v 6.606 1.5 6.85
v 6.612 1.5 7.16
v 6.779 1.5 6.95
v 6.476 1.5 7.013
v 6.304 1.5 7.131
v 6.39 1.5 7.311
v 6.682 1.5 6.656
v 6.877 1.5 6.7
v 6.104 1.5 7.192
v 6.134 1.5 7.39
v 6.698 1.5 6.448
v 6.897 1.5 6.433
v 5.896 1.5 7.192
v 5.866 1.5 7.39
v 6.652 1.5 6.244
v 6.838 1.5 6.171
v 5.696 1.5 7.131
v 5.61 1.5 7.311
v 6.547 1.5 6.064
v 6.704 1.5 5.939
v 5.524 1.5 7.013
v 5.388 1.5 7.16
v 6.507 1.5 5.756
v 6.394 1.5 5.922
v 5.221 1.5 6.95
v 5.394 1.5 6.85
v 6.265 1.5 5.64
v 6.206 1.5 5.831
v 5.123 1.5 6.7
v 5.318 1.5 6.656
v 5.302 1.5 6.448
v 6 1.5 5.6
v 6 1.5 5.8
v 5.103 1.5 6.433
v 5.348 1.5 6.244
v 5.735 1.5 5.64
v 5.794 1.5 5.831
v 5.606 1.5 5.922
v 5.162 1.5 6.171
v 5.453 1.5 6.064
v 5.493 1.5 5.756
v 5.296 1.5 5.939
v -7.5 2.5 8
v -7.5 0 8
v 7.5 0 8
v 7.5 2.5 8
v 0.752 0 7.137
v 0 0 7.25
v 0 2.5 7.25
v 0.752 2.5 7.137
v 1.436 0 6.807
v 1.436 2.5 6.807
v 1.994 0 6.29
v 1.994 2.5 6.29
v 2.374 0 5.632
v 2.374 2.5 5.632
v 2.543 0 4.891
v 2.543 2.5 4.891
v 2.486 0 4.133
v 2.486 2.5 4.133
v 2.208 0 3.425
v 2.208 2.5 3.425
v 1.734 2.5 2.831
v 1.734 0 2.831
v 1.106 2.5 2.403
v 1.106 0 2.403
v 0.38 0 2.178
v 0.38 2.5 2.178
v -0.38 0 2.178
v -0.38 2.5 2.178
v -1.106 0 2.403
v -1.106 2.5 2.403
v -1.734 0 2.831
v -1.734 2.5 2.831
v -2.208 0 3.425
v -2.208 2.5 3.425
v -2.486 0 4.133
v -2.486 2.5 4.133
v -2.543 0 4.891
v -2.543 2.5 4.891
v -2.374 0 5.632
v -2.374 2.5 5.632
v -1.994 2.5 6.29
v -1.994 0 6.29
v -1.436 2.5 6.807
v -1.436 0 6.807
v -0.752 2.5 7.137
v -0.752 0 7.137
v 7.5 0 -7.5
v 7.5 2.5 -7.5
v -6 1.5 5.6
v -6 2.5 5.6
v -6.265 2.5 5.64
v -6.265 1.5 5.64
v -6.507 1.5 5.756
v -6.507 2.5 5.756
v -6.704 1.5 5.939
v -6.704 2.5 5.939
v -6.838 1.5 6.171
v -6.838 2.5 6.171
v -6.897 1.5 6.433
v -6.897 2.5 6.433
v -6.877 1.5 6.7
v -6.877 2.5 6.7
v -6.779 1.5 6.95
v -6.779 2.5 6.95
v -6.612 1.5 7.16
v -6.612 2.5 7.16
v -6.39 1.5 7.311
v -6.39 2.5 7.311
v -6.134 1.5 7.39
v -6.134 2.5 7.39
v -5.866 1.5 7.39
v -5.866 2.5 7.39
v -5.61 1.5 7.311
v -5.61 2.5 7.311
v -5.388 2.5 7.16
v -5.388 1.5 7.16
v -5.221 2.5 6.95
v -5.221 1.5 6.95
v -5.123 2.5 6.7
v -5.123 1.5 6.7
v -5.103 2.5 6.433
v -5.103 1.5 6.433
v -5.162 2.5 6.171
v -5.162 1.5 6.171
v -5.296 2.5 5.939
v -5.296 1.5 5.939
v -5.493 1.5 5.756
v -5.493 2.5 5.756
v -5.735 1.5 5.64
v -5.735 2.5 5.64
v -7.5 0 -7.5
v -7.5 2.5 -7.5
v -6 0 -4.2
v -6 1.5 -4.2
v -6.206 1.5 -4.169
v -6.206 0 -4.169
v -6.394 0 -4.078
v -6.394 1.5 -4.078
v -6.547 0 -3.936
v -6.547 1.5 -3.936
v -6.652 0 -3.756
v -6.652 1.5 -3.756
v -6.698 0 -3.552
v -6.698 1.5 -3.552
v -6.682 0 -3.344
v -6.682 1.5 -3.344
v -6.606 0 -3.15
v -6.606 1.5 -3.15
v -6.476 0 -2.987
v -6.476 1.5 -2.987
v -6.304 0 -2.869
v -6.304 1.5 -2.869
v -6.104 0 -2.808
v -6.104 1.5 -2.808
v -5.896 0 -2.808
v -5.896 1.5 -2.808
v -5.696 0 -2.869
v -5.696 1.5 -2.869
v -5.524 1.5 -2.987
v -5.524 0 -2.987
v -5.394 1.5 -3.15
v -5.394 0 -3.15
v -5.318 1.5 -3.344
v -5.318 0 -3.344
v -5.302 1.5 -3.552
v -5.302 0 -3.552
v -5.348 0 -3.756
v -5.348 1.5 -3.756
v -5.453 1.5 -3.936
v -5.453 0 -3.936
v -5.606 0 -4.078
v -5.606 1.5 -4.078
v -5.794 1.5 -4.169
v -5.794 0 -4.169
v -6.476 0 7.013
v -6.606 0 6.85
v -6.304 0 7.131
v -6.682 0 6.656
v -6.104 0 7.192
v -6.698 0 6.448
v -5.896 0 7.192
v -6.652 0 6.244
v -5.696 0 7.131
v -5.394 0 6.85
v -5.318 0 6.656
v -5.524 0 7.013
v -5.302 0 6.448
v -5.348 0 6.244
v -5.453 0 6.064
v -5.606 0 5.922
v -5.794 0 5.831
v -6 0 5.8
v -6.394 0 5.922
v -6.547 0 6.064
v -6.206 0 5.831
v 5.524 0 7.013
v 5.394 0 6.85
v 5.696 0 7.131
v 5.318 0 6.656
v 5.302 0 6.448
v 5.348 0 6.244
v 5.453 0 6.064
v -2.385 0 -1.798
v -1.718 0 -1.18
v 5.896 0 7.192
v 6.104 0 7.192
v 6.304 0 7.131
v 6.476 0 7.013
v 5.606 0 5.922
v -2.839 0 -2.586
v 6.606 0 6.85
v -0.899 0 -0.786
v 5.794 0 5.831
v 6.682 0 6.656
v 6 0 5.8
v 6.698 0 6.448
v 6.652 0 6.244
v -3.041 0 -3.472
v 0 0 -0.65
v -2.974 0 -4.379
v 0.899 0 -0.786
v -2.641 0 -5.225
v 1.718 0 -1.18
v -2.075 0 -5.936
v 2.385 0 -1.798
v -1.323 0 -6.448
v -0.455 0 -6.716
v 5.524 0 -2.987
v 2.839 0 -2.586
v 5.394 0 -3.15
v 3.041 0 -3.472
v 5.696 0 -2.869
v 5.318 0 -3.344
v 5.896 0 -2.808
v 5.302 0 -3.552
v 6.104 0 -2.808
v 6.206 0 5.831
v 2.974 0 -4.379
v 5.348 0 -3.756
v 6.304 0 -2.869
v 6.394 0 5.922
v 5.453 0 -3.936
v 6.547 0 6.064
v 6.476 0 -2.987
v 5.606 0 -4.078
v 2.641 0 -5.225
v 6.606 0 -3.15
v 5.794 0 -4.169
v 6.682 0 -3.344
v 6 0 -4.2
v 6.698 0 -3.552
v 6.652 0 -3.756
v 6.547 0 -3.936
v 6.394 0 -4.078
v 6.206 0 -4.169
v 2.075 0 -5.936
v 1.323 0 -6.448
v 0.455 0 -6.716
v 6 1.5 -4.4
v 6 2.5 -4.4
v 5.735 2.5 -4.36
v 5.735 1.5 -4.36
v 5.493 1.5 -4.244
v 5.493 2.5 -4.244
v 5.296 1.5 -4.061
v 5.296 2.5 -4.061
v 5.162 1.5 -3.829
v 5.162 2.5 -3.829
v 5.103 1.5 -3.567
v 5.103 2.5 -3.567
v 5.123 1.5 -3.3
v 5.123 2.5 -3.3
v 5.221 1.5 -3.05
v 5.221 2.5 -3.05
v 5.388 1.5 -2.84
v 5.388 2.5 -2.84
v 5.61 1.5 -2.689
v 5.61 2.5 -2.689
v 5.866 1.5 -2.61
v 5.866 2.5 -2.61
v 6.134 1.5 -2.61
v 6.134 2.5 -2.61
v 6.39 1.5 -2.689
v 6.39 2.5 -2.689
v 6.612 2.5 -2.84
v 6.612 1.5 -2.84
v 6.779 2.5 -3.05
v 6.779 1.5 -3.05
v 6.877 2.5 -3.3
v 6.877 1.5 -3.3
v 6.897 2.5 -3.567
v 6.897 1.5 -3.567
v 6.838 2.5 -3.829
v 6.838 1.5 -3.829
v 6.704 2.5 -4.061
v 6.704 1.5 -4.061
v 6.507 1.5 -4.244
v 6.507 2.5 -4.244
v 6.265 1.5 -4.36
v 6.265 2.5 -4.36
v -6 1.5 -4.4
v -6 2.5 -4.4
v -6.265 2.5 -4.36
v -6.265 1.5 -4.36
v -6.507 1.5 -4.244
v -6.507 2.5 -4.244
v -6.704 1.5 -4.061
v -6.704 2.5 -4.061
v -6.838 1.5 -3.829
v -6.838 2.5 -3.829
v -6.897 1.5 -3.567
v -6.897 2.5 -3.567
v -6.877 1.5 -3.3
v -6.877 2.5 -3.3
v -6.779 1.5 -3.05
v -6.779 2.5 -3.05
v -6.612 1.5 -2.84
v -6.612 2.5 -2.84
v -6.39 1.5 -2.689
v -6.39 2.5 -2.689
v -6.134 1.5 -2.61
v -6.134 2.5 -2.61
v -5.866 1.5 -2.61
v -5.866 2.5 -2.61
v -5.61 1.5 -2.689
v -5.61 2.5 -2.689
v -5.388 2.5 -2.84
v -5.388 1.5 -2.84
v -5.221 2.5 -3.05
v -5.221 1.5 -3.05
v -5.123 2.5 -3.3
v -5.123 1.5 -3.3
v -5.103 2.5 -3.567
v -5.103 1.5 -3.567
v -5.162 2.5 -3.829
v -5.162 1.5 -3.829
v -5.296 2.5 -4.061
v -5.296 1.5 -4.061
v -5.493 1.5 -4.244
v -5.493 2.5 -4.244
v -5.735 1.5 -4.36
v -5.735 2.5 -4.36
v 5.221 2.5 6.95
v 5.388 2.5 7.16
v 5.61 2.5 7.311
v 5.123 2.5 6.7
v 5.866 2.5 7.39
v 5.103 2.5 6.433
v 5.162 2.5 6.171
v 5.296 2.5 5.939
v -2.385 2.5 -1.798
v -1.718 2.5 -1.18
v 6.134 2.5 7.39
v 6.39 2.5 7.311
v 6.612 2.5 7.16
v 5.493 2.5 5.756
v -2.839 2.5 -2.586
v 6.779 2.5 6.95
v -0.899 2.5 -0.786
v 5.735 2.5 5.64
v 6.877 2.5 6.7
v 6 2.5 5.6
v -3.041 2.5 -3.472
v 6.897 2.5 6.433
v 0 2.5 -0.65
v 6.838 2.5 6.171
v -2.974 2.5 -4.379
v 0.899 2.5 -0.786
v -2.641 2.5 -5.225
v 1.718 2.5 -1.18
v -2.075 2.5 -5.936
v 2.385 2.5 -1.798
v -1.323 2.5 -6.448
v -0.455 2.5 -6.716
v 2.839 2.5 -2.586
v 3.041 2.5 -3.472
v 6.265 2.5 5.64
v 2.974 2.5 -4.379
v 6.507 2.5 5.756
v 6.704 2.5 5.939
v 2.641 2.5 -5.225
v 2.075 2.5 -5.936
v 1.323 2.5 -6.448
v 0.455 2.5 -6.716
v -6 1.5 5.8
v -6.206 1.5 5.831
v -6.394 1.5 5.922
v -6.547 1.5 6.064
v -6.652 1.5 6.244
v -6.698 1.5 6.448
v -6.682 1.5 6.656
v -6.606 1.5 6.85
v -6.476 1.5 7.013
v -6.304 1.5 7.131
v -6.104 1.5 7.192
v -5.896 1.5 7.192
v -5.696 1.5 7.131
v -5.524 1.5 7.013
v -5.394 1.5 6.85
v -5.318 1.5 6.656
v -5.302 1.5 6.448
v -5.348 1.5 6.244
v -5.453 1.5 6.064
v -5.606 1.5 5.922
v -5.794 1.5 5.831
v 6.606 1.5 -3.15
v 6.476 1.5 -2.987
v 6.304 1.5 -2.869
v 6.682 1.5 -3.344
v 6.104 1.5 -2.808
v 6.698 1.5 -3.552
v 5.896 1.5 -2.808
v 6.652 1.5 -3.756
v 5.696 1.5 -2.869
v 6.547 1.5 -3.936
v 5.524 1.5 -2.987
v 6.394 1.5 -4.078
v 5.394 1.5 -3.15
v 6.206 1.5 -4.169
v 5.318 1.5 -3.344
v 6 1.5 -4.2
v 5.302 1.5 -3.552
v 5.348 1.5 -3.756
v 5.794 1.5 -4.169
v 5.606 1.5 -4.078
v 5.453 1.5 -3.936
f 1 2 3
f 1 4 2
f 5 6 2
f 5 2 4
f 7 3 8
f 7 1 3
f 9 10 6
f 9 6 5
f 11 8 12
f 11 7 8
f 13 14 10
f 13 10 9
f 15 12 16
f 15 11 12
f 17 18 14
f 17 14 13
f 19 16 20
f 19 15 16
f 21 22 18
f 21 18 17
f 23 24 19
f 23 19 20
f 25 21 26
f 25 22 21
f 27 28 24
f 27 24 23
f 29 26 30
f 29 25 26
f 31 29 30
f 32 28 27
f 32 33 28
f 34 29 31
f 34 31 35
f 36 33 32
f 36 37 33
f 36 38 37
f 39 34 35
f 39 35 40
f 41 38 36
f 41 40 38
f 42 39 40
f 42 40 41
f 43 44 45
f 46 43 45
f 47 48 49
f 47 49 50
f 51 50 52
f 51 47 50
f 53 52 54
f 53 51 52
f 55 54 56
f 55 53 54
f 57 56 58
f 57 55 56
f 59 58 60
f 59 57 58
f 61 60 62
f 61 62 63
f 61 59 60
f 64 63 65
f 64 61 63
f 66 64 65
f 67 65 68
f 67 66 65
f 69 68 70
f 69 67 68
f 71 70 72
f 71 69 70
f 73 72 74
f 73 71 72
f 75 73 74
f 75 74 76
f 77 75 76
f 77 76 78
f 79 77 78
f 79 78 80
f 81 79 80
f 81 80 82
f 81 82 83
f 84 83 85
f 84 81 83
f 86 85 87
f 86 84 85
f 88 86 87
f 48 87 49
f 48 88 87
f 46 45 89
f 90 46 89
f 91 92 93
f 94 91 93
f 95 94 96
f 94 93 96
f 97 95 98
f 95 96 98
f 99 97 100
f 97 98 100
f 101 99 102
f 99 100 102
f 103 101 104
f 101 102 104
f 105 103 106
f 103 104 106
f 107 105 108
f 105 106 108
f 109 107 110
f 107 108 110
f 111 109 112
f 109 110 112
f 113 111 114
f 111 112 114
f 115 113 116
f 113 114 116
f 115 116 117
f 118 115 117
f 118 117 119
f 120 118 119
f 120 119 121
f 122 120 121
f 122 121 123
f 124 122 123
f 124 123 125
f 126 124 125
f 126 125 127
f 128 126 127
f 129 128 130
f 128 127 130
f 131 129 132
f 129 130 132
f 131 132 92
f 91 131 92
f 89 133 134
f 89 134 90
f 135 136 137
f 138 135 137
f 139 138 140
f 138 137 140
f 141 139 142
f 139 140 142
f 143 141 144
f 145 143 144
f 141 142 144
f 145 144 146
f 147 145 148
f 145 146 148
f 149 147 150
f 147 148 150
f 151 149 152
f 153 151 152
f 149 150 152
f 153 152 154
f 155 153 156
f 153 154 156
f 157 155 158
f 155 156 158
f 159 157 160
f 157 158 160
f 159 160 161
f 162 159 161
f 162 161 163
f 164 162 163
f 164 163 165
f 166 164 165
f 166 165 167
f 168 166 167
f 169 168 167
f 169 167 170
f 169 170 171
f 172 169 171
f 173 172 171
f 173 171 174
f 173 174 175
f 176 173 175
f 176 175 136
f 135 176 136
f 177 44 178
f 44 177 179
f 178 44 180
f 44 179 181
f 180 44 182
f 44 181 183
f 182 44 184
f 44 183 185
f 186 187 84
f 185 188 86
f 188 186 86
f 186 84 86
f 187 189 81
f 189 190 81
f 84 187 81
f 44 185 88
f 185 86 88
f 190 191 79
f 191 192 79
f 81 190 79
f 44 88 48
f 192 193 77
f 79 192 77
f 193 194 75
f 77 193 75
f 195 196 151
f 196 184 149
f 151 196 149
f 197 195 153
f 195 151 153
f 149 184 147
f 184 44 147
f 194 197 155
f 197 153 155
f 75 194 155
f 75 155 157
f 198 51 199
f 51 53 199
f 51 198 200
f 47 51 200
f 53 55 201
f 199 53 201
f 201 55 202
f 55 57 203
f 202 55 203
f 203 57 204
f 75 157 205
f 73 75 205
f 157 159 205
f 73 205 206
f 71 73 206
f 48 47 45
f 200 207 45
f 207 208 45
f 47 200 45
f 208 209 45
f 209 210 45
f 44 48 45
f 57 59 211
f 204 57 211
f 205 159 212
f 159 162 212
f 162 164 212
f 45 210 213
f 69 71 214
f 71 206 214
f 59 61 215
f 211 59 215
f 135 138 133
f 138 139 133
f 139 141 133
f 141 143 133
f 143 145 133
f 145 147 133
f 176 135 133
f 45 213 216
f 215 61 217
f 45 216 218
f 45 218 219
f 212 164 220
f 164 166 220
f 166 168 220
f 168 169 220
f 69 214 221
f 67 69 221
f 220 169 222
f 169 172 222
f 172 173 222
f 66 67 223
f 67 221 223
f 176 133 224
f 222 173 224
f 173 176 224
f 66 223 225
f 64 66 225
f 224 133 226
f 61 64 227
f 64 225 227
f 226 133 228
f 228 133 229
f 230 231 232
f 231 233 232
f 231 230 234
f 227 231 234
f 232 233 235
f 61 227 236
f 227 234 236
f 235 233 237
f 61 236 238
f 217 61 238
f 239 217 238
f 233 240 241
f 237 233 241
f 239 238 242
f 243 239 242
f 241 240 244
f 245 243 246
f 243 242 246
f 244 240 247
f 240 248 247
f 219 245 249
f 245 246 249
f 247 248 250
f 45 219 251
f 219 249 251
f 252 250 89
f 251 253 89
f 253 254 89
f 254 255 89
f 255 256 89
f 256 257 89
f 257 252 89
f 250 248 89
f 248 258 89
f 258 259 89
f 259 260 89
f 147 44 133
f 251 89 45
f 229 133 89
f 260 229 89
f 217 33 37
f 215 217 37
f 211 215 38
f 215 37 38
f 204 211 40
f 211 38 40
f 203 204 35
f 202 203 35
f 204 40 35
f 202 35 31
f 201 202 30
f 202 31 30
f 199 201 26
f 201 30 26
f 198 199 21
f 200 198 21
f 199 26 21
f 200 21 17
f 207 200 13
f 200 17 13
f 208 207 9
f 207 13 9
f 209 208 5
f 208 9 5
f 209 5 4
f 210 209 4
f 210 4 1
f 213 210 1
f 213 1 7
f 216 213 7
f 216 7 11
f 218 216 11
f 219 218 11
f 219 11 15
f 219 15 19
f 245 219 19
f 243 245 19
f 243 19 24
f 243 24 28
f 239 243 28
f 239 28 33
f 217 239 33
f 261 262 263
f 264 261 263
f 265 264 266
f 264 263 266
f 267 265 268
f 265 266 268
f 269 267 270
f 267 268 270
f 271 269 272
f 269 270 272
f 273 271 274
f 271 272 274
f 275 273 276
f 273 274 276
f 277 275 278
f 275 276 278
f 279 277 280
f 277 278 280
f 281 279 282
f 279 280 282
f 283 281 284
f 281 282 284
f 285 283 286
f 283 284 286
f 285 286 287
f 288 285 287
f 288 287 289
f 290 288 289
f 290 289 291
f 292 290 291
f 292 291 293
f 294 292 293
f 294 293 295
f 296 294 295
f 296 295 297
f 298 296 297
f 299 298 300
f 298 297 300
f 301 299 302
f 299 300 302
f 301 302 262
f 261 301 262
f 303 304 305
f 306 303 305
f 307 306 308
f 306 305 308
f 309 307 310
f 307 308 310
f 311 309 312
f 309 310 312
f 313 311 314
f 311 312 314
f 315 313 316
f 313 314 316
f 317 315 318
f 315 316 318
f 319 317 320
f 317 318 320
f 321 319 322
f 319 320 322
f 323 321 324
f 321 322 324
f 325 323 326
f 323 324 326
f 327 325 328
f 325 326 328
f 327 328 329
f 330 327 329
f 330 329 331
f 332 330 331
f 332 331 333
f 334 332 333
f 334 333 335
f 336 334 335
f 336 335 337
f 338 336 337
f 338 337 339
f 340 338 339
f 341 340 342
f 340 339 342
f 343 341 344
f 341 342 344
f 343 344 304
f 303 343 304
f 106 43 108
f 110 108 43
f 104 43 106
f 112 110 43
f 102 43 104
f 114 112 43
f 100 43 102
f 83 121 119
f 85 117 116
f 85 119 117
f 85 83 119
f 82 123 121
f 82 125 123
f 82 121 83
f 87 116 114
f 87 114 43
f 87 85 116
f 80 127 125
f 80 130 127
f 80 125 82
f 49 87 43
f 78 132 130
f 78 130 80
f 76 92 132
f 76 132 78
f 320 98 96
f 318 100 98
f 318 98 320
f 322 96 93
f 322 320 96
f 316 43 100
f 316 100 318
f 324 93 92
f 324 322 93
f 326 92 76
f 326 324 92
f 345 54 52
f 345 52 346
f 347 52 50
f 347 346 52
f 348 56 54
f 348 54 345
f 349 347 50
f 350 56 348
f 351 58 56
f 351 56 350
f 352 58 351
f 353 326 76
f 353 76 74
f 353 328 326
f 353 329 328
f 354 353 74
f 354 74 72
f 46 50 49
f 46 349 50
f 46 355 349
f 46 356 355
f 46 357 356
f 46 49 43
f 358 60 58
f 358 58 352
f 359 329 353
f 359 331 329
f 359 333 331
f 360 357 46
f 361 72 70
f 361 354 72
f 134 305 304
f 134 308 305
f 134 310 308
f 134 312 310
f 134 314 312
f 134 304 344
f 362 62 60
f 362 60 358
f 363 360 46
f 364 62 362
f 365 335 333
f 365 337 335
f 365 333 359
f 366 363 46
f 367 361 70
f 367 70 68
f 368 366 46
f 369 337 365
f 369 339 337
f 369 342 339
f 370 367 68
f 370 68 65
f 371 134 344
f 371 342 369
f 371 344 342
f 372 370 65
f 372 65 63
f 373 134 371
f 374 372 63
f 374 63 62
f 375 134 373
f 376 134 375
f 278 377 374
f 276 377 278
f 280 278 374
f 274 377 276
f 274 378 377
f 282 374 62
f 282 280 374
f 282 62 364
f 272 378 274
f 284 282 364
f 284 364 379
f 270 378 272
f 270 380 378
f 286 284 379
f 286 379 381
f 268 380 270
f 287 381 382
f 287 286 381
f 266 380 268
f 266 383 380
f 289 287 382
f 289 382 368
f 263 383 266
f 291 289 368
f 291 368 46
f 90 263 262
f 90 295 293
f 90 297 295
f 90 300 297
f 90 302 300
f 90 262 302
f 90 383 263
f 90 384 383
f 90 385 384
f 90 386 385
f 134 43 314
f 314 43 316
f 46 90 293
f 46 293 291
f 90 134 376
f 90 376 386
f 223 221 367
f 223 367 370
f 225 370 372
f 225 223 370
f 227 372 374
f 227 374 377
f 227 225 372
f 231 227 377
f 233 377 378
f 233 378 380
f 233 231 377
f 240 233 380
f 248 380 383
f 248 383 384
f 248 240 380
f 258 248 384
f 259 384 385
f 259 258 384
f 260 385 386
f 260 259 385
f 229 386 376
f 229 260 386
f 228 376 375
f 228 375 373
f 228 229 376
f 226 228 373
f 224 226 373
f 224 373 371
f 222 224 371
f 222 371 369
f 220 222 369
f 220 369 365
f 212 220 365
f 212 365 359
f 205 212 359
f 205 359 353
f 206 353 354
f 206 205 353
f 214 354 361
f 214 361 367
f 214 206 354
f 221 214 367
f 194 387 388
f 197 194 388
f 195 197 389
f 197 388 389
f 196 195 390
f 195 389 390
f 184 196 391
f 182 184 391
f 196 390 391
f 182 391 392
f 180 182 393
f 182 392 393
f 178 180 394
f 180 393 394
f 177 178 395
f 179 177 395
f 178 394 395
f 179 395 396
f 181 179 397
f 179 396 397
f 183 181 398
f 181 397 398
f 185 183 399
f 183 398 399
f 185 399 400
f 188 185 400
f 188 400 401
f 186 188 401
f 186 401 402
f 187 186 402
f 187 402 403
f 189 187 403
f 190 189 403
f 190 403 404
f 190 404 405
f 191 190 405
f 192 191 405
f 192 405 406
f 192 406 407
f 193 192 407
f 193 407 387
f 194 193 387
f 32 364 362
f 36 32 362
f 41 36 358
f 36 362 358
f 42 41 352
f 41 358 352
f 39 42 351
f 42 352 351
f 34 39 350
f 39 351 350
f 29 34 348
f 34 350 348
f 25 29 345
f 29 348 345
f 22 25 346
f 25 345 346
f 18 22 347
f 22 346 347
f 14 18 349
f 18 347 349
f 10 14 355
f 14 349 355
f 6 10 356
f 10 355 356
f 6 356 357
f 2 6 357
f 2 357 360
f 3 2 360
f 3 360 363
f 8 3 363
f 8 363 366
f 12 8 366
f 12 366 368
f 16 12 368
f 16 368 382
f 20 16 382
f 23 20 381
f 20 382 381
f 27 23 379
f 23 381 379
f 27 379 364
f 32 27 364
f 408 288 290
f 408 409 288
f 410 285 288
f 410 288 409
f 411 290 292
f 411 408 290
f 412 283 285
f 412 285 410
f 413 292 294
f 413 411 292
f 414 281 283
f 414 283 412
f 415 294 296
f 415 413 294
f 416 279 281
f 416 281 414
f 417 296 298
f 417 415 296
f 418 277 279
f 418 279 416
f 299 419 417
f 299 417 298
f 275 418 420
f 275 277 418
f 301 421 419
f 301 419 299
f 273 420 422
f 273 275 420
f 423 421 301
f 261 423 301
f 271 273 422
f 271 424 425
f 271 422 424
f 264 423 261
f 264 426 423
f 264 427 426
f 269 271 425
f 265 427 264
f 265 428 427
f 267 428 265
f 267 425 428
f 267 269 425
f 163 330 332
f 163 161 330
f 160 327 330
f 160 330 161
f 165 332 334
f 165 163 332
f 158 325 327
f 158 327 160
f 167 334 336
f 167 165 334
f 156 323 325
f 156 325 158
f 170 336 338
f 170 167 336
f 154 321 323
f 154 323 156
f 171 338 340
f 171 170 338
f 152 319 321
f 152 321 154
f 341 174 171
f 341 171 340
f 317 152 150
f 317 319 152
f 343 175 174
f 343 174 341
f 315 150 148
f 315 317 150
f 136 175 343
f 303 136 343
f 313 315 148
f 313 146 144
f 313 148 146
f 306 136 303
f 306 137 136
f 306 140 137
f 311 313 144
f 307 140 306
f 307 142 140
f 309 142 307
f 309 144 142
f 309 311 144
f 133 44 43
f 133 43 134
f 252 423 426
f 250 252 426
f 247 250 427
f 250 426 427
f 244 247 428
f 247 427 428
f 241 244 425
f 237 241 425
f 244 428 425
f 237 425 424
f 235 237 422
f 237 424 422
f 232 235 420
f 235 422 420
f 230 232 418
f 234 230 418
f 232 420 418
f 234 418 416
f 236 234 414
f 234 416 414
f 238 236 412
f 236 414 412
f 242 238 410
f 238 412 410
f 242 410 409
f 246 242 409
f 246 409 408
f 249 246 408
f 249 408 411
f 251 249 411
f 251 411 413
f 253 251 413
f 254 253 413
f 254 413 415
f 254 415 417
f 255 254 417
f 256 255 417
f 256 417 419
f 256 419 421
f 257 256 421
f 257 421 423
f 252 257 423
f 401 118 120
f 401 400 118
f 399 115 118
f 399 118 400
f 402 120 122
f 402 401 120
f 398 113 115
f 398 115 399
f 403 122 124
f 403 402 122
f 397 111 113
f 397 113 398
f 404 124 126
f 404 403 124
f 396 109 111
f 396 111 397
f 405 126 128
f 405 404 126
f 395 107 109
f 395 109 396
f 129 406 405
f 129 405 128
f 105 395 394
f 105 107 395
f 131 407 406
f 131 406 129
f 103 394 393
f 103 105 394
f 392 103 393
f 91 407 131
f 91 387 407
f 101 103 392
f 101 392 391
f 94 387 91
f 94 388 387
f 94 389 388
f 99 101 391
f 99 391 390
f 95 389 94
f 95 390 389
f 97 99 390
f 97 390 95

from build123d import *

# Parameters (mm, degrees)
SKETCH_1_W          = 15
SKETCH_1_H          = 15.5
SKETCH_1_R          = 2.55
SKETCH_1_R_2        = 3.05
EXTRUDE_1_DEPTH     = 2.5
CUT_EXTRUDE_START   = 2.5
SKETCH_1_4_R        = 0.9
CUT_EXTRUDE_2_DEPTH = 1
SKETCH_1_5_R        = 0.7
CUT_EXTRUDE_3_DEPTH = 14.747221879


with BuildPart() as part:
    # 草图1 → 凸台-拉伸1 (new body)
    with BuildSketch(Plane(origin=(0, 0, 0), x_dir=(1, 0, 0), z_dir=(0, 1, 0))):
        with Locations((0, -0.25)):
            Rectangle(SKETCH_1_W, SKETCH_1_H)
        with Locations(Location((0, -4.7, 0), (0, 0, 270))):
            Circle(SKETCH_1_R, mode=Mode.SUBTRACT)
        with Locations(Location((0, 3.7, 0), (0, 0, 270))):
            Circle(SKETCH_1_R_2, mode=Mode.SUBTRACT)
    extrude(amount=EXTRUDE_1_DEPTH)

    # 草图1<4> → 切除-拉伸2 (cut)
    with BuildSketch(Plane(origin=(0, 0, 0), x_dir=(1, 0, 0), z_dir=(0, 1, 0)).offset(CUT_EXTRUDE_START)):
        with Locations(Location((-6, -6.5, 0), (0, 0, 90))):
            Circle(SKETCH_1_4_R)
        with Locations(Location((6, 3.5, 0), (0, 0, 90))):
            Circle(SKETCH_1_4_R)
        with Locations(Location((-6, 3.5, 0), (0, 0, 90))):
            Circle(SKETCH_1_4_R)
        with Locations(Location((6, -6.5, 0), (0, 0, 90))):
            Circle(SKETCH_1_4_R)
    extrude(amount=-CUT_EXTRUDE_2_DEPTH, mode=Mode.SUBTRACT)

    # 草图1<5> → 切除-拉伸3 (cut, through all)
    with BuildSketch(Plane(origin=(0, 0, 0), x_dir=(1, 0, 0), z_dir=(0, 1, 0)).offset(CUT_EXTRUDE_START)):
        with Locations(Location((-6, -6.5, 0), (0, 0, 90))):
            Circle(SKETCH_1_5_R)
        with Locations(Location((6, 3.5, 0), (0, 0, 90))):
            Circle(SKETCH_1_5_R)
        with Locations(Location((-6, 3.5, 0), (0, 0, 90))):
            Circle(SKETCH_1_5_R)
        with Locations(Location((6, -6.5, 0), (0, 0, 90))):
            Circle(SKETCH_1_5_R)
    extrude(amount=-CUT_EXTRUDE_3_DEPTH, mode=Mode.SUBTRACT)


solid = part.part
